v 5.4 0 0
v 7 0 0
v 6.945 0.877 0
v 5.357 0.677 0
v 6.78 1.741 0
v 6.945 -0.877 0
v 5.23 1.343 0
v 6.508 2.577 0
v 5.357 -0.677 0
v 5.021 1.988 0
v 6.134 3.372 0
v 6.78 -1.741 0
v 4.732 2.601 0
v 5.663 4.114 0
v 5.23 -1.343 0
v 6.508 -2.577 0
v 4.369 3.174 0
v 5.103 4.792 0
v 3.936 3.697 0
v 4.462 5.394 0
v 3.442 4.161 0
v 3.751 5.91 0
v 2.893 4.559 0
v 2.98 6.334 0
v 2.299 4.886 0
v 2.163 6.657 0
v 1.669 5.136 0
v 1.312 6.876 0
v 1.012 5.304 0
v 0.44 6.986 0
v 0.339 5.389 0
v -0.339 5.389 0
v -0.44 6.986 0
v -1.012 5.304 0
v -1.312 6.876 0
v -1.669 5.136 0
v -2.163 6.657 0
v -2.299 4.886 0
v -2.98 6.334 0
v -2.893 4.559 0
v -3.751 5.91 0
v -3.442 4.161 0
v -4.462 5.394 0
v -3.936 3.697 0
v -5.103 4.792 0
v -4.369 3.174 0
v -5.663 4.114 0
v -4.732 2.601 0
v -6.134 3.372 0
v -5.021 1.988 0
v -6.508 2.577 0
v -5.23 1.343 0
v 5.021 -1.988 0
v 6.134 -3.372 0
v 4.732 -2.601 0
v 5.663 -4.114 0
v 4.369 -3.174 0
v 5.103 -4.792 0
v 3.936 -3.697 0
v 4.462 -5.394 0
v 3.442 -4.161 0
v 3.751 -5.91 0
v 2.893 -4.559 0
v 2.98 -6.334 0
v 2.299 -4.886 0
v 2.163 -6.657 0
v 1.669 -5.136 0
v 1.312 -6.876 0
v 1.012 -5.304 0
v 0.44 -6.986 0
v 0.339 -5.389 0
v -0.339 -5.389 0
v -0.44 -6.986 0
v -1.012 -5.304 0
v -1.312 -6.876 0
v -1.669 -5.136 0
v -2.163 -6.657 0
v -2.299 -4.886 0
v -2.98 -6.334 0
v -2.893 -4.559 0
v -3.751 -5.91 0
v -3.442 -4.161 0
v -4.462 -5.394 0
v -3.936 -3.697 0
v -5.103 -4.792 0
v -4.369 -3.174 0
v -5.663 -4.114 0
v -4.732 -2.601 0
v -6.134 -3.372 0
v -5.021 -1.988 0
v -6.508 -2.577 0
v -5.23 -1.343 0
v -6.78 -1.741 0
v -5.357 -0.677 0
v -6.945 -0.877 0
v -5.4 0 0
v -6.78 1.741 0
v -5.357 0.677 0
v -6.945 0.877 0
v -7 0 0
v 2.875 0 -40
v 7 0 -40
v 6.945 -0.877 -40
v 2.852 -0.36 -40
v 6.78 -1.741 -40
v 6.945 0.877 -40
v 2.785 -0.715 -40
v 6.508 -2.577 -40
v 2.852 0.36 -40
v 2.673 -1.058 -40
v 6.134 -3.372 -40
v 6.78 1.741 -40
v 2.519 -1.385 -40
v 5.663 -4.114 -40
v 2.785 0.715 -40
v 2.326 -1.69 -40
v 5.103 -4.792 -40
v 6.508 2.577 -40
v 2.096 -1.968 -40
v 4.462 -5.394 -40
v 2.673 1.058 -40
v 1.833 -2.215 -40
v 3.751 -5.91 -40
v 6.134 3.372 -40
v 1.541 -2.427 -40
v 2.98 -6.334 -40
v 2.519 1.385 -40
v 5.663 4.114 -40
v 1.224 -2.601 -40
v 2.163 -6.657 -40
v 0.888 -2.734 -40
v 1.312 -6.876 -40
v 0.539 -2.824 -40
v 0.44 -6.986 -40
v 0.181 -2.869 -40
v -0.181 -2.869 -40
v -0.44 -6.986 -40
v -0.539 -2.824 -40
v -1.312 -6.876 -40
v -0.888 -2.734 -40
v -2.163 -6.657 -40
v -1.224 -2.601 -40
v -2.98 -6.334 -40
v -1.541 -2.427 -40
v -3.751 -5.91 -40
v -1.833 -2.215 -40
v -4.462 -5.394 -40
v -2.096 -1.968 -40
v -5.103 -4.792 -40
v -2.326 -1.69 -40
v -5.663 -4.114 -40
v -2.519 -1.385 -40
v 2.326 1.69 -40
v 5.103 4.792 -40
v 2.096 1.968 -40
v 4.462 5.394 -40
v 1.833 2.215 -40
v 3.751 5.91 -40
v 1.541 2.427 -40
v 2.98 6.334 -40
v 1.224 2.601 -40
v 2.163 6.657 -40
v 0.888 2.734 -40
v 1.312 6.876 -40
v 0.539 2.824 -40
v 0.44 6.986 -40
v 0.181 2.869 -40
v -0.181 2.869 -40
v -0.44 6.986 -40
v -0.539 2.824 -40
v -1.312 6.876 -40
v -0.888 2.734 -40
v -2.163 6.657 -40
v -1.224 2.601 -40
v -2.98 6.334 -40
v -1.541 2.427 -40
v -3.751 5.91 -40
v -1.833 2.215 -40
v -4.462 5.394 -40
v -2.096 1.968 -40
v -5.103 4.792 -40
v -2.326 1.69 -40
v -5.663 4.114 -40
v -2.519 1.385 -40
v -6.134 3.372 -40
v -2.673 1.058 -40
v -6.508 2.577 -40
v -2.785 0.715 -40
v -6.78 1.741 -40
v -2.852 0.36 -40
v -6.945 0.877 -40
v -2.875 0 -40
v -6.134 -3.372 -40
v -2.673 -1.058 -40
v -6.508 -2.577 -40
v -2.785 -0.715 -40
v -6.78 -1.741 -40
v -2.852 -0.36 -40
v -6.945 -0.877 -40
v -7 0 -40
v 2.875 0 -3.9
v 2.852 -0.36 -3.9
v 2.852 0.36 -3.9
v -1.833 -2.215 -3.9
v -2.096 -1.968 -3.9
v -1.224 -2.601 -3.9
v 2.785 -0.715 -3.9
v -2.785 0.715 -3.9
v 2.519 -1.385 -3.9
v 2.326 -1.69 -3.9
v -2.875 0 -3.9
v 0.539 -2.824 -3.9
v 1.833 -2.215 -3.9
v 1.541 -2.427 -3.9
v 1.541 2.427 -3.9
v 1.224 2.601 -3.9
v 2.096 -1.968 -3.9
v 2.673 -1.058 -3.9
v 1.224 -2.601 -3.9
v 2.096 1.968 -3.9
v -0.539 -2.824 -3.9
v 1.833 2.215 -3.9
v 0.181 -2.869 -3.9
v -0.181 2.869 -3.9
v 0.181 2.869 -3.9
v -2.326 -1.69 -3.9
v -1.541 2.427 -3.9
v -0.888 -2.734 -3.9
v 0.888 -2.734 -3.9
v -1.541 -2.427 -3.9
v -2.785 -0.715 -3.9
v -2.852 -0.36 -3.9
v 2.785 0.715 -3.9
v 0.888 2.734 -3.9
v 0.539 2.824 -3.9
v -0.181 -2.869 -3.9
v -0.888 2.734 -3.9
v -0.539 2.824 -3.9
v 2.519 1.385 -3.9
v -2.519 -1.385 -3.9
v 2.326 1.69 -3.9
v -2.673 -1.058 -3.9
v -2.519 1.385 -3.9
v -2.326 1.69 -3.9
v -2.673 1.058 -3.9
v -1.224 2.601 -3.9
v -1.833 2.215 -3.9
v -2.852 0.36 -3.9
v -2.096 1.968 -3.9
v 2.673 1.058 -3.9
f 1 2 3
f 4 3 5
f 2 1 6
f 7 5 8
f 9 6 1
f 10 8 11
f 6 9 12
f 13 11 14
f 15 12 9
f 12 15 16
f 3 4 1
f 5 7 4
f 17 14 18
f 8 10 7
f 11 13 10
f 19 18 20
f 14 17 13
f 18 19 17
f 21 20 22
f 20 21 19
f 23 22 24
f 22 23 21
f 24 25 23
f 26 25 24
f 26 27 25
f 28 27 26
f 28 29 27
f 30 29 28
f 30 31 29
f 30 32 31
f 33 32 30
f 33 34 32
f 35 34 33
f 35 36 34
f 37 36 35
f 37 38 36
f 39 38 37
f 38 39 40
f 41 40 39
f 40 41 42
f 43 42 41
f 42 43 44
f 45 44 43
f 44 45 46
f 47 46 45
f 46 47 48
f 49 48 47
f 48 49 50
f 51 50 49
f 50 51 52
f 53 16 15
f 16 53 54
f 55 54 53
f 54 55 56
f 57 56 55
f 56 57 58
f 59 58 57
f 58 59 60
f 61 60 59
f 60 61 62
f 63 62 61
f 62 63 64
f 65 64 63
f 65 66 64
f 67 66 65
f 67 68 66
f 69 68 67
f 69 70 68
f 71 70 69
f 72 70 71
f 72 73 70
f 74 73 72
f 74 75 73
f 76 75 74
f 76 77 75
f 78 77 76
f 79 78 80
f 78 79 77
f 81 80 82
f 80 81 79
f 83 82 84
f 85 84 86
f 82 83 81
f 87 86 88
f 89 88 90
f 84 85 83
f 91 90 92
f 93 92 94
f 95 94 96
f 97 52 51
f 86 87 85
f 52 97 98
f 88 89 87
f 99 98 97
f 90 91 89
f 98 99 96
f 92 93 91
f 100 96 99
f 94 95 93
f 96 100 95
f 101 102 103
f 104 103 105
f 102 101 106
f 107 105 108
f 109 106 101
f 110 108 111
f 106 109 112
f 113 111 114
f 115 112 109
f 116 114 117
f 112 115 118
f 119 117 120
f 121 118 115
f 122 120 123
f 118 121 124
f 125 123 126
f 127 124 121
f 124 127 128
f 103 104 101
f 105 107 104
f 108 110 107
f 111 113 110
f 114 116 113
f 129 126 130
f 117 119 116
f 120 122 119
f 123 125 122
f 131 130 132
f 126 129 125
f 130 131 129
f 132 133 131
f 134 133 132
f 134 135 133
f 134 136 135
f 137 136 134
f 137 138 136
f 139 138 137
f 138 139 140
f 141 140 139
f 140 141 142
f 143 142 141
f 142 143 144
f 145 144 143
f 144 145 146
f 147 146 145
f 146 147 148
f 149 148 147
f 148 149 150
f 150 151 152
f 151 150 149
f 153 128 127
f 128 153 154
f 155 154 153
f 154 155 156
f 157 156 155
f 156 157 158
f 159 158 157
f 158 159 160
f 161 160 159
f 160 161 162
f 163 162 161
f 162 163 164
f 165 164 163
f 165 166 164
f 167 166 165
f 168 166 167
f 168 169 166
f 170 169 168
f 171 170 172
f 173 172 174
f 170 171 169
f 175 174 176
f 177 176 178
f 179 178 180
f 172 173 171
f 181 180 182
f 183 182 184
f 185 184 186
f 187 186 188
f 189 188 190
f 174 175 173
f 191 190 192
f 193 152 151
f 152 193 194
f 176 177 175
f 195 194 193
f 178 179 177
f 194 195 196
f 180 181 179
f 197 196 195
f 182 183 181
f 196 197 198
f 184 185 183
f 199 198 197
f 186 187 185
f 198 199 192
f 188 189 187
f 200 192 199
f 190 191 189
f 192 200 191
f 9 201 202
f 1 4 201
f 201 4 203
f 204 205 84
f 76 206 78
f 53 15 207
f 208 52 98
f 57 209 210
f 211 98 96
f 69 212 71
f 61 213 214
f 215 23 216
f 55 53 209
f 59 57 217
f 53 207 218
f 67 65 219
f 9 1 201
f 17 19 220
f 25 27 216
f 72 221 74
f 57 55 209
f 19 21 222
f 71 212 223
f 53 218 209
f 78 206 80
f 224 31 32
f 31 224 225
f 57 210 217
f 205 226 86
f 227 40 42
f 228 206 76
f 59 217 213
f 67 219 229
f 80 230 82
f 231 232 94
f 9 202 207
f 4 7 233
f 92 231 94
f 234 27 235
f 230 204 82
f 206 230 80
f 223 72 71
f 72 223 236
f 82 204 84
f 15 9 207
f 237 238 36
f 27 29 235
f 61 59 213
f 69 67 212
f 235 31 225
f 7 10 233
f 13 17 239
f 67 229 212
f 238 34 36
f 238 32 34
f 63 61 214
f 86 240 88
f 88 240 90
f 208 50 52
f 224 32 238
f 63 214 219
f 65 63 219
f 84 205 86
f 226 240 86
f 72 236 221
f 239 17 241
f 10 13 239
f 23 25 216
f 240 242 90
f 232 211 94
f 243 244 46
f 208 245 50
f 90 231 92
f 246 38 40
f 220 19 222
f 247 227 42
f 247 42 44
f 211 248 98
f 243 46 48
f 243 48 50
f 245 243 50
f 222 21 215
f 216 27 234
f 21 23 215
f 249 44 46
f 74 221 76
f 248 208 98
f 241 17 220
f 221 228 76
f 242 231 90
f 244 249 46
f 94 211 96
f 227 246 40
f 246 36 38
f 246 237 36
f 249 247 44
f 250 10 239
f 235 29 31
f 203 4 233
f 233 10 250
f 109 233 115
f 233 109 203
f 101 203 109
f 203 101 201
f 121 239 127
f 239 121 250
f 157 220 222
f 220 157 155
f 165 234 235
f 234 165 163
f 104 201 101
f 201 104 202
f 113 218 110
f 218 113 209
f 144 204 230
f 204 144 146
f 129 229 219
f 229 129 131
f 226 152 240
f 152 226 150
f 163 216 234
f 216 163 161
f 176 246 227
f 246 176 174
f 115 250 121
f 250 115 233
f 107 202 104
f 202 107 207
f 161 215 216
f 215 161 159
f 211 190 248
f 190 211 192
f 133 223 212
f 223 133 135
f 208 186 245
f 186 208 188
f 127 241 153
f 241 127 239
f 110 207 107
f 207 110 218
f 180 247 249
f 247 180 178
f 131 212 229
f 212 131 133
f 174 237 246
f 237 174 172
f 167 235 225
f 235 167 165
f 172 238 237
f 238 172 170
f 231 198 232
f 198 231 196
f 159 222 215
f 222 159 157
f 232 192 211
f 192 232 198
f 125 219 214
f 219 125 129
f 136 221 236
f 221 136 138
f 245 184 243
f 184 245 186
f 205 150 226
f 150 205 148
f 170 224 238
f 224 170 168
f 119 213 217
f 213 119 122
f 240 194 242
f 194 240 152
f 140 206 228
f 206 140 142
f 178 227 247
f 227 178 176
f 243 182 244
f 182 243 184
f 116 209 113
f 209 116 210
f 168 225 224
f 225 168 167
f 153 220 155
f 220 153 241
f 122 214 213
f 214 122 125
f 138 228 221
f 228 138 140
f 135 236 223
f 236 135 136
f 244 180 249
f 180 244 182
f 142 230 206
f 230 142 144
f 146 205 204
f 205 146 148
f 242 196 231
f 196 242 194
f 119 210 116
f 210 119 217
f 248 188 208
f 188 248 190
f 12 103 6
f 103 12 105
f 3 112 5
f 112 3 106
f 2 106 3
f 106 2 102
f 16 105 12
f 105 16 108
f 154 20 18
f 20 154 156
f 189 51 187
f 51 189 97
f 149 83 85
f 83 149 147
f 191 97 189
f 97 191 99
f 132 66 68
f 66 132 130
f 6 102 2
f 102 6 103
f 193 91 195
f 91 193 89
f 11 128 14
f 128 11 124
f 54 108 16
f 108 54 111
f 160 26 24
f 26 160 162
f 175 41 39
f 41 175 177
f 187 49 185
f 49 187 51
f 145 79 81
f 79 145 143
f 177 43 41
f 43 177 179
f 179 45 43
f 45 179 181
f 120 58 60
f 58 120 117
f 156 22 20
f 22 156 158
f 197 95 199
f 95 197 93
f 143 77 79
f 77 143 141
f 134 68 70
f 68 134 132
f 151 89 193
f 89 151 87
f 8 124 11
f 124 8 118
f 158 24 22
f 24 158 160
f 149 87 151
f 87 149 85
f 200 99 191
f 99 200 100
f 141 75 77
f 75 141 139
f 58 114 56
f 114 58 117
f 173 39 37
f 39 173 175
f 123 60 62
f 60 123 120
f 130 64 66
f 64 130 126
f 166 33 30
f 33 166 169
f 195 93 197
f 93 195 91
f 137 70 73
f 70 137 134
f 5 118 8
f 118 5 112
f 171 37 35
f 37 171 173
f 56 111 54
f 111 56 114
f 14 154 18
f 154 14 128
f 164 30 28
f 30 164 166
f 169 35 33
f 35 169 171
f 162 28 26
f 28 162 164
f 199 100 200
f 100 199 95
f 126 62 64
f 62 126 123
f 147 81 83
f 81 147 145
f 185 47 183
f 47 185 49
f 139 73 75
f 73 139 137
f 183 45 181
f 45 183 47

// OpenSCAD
$fn = 50;


difference() {
	union() {
		translate(v = [0, 0, -40.0000000000]) {
			cylinder(h = 40, r = 7.0000000000);
		}
		cylinder(h = 0, r = 10.0000000000);
	}
	union() {
		translate(v = [0, 0, 0]) {
			rotate(a = [0, 0, 0]) {
				difference() {
					union() {
						#translate(v = [0, 0, -40.0000000000]) {
							cylinder(h = 40, r = 2.6000000000);
						}
						#translate(v = [0, 0, -3.9000000000]) {
							cylinder(h = 3.9000000000, r1 = 2.8750000000, r2 = 5.4000000000);
						}
						#translate(v = [0, 0, -40.0000000000]) {
							cylinder(h = 40, r = 2.8750000000);
						}
						#translate(v = [0, 0, -40.0000000000]) {
							cylinder(h = 40, r = 2.6000000000);
						}
					}
					union();
				}
			}
		}
	}
}
